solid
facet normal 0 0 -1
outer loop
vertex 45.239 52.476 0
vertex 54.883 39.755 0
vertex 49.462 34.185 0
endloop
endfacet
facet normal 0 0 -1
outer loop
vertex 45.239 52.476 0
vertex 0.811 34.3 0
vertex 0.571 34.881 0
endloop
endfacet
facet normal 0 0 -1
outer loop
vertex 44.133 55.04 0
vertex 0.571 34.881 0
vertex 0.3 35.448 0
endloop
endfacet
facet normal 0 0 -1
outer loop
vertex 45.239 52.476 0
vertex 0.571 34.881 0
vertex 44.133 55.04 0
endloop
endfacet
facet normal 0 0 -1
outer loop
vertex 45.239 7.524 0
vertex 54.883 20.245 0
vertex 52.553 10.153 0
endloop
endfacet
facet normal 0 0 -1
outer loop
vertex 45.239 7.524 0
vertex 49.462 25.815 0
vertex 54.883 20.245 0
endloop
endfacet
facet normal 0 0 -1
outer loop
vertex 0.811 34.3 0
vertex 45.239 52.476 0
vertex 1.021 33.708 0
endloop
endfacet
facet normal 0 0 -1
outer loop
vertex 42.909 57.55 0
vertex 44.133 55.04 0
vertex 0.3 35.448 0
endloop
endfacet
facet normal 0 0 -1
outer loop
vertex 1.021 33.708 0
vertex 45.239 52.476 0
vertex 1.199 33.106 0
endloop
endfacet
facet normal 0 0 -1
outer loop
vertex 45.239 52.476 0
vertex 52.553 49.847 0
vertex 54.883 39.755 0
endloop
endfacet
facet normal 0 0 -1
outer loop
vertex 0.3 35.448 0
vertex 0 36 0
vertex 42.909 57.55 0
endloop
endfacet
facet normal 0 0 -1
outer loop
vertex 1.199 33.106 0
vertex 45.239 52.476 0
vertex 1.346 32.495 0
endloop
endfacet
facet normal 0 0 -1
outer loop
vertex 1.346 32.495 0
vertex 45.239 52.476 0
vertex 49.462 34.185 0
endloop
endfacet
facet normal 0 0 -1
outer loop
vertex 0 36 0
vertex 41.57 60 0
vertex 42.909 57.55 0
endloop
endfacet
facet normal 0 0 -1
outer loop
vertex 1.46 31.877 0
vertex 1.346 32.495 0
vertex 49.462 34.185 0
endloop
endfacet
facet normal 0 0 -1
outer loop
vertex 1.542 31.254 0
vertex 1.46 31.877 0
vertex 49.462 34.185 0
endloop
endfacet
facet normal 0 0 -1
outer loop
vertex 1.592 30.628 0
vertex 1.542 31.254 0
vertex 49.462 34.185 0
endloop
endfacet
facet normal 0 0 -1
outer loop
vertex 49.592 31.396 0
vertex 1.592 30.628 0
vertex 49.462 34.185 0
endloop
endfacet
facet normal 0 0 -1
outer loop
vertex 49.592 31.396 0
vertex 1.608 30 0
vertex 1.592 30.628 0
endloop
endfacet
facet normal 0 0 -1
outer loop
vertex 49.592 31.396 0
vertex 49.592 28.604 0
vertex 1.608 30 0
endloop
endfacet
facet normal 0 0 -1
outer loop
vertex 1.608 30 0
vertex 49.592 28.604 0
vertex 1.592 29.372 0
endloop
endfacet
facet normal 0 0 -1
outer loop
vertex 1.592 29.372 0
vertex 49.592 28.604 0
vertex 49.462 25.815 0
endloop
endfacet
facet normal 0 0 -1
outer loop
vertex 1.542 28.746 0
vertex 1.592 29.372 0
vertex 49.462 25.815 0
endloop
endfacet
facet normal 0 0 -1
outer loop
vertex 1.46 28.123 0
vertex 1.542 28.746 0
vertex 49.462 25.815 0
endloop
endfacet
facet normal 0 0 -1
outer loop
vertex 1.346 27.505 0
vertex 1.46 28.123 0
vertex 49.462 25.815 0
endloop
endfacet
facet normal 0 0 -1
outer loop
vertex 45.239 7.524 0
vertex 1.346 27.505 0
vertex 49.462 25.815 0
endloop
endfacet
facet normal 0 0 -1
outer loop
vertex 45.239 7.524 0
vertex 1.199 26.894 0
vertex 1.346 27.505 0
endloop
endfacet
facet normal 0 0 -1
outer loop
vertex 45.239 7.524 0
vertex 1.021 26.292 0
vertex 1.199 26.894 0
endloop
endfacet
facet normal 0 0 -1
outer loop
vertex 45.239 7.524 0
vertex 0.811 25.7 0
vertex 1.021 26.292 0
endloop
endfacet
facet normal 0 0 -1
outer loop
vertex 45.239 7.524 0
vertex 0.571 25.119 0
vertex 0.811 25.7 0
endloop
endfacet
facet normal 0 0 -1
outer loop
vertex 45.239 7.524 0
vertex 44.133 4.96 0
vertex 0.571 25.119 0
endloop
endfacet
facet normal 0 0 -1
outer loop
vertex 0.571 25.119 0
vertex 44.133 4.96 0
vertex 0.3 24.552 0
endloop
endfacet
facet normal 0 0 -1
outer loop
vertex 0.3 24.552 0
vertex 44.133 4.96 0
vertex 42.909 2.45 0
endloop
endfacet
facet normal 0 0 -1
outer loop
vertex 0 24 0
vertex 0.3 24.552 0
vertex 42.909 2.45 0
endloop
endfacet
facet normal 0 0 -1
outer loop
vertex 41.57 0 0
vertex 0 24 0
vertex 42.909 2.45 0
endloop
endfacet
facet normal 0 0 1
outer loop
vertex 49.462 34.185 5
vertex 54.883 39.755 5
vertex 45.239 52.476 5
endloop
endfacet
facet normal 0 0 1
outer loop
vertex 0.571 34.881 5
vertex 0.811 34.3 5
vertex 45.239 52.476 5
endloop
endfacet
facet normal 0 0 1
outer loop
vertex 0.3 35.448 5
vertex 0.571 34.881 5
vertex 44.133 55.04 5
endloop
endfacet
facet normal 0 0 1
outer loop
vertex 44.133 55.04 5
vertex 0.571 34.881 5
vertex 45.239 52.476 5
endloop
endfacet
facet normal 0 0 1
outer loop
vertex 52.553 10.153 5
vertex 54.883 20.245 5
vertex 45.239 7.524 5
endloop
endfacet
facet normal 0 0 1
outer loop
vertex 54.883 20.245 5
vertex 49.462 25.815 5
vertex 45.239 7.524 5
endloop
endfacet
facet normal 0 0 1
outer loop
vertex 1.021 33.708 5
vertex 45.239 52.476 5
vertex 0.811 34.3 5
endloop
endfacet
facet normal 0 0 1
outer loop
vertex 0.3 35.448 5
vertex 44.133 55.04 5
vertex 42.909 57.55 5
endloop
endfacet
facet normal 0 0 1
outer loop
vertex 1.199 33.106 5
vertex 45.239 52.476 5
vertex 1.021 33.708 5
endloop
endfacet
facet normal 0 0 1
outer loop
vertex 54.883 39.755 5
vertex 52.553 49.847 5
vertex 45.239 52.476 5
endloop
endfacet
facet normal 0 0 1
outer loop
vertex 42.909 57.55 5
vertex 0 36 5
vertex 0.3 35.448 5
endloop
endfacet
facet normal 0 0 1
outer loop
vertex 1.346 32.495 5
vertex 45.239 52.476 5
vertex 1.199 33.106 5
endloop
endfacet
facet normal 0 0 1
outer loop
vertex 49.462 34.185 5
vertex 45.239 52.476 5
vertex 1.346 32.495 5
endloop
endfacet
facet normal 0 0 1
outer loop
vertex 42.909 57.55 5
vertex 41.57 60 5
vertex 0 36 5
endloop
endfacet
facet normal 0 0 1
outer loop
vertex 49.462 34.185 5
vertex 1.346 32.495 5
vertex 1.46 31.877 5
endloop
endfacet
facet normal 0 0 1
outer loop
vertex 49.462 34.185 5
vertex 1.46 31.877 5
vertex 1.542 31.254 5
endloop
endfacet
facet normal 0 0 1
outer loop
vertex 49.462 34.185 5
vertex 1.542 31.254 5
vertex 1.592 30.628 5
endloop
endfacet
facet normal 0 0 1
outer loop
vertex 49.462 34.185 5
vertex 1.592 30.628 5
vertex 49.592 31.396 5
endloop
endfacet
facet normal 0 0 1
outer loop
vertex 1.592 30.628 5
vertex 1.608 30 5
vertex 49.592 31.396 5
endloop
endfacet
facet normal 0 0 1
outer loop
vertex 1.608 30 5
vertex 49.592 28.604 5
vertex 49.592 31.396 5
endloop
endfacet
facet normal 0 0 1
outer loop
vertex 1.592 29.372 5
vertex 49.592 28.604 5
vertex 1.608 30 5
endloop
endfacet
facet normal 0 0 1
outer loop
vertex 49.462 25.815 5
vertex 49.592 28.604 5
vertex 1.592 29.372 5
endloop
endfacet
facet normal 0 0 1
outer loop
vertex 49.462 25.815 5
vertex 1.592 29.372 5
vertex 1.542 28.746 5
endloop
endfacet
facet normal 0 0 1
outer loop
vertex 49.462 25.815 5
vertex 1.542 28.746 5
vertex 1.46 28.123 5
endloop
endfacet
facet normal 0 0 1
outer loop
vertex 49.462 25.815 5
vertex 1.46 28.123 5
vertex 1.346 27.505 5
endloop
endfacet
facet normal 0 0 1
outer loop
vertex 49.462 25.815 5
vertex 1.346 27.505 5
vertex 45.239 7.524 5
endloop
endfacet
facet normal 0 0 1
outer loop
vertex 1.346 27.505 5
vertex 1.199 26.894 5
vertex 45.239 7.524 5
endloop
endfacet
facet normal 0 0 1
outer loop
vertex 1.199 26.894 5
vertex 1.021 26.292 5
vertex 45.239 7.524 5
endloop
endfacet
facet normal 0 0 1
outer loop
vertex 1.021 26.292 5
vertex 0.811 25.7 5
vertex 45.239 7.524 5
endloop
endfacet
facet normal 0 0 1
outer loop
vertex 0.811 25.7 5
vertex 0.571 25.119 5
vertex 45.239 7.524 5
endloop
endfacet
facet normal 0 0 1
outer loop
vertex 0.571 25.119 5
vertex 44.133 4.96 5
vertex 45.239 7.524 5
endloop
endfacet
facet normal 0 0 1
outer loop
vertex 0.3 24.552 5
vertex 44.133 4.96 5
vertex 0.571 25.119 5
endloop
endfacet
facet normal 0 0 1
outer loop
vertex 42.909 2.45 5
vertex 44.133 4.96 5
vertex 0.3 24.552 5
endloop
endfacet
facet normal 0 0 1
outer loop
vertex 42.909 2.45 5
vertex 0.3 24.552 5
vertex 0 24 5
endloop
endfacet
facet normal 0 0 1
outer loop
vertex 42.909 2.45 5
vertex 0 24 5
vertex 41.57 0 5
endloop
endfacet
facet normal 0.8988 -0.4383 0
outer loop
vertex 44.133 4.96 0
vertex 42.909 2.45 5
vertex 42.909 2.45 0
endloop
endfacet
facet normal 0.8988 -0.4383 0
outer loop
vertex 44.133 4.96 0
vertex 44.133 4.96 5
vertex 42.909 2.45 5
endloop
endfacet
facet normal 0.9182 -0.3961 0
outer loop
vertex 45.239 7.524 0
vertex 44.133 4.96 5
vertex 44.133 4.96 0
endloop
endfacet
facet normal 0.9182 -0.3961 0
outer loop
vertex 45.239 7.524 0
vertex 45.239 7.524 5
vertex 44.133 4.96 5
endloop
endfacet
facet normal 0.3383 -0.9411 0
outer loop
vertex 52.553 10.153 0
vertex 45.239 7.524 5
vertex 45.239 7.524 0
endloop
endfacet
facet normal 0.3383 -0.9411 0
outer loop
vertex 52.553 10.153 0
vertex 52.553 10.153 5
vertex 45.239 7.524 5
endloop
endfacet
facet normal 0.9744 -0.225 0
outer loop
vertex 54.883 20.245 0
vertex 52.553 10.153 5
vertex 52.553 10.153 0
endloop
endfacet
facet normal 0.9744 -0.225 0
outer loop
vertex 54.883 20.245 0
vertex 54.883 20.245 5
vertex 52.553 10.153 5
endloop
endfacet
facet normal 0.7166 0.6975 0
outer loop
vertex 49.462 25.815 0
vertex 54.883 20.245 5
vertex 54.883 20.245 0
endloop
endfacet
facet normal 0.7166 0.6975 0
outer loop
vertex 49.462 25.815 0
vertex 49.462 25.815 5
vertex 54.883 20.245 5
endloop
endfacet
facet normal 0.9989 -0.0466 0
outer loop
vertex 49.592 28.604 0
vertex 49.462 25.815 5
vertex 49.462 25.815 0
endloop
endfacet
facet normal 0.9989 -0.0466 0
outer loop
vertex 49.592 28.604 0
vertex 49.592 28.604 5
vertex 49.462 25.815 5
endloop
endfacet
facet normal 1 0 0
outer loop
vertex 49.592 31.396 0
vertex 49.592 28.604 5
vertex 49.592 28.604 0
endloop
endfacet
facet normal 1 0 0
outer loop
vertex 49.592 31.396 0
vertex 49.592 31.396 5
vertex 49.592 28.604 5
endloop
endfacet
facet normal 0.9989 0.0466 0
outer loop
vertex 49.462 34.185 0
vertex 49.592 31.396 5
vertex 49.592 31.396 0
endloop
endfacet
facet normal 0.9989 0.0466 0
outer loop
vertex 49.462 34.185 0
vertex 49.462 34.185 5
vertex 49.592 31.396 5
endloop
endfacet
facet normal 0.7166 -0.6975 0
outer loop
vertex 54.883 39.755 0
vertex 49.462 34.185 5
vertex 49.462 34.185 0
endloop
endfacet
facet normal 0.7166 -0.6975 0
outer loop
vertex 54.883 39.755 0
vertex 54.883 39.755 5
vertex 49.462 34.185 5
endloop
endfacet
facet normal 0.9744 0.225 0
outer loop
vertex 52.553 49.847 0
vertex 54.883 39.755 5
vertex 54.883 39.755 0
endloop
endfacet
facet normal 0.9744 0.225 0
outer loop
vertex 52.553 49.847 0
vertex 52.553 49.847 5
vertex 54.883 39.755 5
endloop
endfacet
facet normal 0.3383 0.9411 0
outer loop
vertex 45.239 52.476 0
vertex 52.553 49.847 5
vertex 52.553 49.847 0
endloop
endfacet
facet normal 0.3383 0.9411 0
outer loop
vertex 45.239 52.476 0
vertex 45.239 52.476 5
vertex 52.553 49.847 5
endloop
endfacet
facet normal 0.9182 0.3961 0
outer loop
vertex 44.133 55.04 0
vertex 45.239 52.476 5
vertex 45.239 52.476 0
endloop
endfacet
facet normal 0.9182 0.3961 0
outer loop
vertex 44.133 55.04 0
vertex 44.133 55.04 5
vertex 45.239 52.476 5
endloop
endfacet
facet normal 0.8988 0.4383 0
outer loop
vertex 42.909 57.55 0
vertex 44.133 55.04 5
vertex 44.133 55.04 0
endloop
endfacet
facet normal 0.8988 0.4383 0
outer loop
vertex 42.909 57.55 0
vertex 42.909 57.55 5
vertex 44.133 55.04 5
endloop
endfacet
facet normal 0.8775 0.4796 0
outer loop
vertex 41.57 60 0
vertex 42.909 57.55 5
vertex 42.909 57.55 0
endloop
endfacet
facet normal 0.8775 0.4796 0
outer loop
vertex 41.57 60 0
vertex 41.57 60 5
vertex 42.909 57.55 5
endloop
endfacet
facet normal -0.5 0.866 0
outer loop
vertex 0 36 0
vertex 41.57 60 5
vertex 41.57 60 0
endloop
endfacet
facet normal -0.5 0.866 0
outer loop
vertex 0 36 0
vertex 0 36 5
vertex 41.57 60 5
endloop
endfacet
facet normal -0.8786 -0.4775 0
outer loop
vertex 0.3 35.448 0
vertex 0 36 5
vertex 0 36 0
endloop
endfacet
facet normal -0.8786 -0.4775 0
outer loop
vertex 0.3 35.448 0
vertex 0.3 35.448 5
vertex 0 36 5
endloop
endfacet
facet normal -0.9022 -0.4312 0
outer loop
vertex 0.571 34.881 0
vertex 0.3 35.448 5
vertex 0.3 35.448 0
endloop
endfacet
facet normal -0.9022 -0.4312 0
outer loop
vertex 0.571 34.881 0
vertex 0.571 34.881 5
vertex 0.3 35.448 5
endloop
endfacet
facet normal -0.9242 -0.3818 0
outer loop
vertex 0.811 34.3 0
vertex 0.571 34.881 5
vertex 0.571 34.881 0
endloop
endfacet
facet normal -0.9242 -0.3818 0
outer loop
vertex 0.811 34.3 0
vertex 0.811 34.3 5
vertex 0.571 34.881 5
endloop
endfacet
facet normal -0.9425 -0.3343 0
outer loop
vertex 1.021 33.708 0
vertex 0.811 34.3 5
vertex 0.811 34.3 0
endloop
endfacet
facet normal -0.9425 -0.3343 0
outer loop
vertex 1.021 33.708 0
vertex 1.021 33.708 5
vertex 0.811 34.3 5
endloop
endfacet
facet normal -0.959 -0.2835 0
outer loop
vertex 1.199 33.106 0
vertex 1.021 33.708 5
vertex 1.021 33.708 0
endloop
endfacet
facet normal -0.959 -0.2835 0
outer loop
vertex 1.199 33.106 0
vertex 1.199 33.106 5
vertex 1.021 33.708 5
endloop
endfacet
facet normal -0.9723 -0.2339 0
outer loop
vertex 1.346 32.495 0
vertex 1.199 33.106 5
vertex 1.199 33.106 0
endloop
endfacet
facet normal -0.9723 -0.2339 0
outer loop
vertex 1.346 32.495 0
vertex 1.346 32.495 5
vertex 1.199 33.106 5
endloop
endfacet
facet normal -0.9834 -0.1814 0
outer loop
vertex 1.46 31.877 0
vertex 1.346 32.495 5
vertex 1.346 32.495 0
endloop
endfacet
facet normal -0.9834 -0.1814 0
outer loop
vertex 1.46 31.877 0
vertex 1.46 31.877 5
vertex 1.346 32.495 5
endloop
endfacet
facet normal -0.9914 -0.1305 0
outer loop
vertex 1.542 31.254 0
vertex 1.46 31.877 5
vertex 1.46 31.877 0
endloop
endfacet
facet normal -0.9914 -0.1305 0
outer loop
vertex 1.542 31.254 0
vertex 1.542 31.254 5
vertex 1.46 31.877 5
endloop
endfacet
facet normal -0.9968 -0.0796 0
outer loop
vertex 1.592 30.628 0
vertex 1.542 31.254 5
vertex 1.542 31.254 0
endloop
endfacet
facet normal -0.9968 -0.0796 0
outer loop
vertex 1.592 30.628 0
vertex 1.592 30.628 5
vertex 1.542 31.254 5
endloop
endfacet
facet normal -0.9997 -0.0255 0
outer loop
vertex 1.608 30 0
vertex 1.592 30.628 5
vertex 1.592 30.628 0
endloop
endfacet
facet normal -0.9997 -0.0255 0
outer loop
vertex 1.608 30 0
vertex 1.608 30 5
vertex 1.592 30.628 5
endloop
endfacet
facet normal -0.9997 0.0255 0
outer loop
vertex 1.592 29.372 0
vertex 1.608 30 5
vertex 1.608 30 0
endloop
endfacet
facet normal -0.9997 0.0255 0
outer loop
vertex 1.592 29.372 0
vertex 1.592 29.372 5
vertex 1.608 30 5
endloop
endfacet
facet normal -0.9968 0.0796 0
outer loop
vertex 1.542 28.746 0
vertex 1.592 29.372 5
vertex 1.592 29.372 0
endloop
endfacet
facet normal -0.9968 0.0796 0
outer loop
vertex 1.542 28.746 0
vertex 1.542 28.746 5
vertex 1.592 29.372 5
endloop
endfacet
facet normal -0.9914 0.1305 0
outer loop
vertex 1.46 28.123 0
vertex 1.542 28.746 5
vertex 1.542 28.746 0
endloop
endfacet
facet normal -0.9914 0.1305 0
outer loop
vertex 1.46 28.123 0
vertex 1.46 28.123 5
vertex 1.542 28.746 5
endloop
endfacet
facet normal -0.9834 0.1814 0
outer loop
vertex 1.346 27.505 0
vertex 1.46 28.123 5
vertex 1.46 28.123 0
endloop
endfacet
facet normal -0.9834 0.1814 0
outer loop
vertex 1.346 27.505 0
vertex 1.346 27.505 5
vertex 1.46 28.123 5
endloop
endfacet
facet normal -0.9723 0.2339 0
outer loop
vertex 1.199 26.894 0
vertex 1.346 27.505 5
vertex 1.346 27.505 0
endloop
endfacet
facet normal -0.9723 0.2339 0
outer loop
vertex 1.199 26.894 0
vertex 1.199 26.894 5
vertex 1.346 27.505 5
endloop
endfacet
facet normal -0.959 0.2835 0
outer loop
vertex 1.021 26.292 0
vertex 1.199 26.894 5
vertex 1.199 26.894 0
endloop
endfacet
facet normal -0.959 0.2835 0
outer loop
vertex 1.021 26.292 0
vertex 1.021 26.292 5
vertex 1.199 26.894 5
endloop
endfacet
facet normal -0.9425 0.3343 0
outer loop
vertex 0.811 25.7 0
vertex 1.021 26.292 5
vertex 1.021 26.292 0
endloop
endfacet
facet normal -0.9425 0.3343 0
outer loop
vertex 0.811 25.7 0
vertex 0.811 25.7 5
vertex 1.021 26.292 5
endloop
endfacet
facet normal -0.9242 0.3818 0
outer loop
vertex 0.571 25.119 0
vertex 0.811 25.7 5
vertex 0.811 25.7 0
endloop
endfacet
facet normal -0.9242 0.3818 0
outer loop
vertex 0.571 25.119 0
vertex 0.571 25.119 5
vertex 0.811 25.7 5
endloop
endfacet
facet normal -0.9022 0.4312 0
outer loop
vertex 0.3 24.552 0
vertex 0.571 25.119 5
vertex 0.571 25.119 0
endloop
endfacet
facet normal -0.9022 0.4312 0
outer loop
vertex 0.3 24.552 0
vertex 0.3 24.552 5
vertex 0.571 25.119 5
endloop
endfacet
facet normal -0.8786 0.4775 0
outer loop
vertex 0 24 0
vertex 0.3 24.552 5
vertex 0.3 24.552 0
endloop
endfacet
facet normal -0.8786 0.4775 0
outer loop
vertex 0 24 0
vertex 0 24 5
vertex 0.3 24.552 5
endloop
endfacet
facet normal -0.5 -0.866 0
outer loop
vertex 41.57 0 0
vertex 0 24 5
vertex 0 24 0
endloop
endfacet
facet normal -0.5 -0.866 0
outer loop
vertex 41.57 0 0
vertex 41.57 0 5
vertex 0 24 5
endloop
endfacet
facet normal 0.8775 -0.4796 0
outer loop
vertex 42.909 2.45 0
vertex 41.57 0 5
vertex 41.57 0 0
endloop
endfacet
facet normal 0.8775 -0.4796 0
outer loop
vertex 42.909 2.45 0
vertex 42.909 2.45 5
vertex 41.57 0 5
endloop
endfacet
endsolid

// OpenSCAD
$fn = 32;

// ----------------------------------------------------------------------
// Gear sector: 2 teeth on 60 degrees
// ----------------------------------------------------------------------

// --- parameters (mm) ---
sector_angle = 60;        // sector angle, degrees
root_r = 60;              // root circle radius
tooth_h = 6;              // tooth height over the root circle
teeth = 2;                // number of teeth on the sector
hub_r = 12;               // hub bore radius
plate_t = 5;              // sector thickness, Z
arc_step = 3;             // sampling step of the root/hub arcs, degrees

tip_r = root_r + tooth_h;  // tip circle radius

profile = [[41.57, 0], [42.909, 2.45], [44.133, 4.96], [45.239, 7.524], [52.553, 10.153], [54.883, 20.245], [49.462, 25.815], [49.592, 28.604], [49.592, 31.396], [49.462, 34.185], [54.883, 39.755], [52.553, 49.847], [45.239, 52.476], [44.133, 55.04], [42.909, 57.55], [41.57, 60], [0, 36], [0.3, 35.448], [0.571, 34.881], [0.811, 34.3], [1.021, 33.708], [1.199, 33.106], [1.346, 32.495], [1.46, 31.877], [1.542, 31.254], [1.592, 30.628], [1.608, 30], [1.592, 29.372], [1.542, 28.746], [1.46, 28.123], [1.346, 27.505], [1.199, 26.894], [1.021, 26.292], [0.811, 25.7], [0.571, 25.119], [0.3, 24.552], [0, 24]];  // primary outline, 37 points, counter clockwise

// --- the one profile operation ---
linear_extrude(height = plate_t) polygon(points = profile);
